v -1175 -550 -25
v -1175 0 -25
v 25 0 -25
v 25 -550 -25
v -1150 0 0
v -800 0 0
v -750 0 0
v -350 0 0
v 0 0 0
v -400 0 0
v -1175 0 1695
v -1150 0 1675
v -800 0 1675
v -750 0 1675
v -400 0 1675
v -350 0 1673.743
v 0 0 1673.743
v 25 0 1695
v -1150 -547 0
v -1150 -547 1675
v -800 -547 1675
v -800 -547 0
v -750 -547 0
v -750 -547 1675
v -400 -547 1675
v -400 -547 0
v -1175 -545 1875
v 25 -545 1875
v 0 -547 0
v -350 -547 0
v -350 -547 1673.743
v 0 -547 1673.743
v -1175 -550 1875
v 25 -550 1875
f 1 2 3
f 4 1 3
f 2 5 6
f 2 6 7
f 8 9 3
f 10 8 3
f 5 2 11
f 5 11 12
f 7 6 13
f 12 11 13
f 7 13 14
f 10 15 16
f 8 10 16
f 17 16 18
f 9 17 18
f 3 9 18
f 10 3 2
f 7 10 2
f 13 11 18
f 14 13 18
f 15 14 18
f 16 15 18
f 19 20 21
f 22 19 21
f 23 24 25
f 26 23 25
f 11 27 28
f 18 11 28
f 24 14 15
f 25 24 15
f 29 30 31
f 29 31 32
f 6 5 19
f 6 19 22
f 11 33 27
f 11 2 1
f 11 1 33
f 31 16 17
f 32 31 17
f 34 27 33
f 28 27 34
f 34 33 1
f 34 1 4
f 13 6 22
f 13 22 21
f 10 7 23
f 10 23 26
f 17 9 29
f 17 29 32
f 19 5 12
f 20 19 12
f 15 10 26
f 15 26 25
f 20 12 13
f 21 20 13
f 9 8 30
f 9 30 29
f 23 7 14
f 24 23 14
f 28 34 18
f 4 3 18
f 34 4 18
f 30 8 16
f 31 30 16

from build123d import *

# Parameters (mm, degrees)
F0_W     = 1200
F0_H     = 1900
F0_W_2   = 350
F0_H_2   = 1675
F0_H_3   = 1673.7432479858
F1_DEPTH = 550
F2_SIZE2 = 545
F2_SIZE  = 180
F3_START = 547
F3_DEPTH = 3


with BuildPart() as f1:
    # F0 (on Front) → F1 (new body)
    with BuildSketch(Plane.XZ):
        with Locations((-575, 925)):
            Rectangle(F0_W, F0_H)
        with Locations((-975, 837.5)):
            Rectangle(F0_W_2, F0_H_2, mode=Mode.SUBTRACT)
        with Locations((-575, 837.5)):
            Rectangle(F0_W_2, F0_H_2, mode=Mode.SUBTRACT)
        with Locations((-175, 836.8716239929)):
            Rectangle(F0_W_2, F0_H_3, mode=Mode.SUBTRACT)
    extrude(amount=F1_DEPTH)

    # F2
    f2_edges = [f1.edges().sort_by_distance(p)[0] for p in [
        (-575, 0, 1875),
    ]]
    f2_side = f1.faces().sort_by_distance((-575, 0, 1852.527795))[0]
    chamfer(f2_edges, length=F2_SIZE, length2=F2_SIZE2, reference=f2_side)

    # F0 (on Front) → F3 (join)
    with BuildSketch(Plane.XZ.offset(F3_START)):
        with Locations((-575, 925)):
            Rectangle(F0_W, F0_H)
        with Locations((-975, 837.5)):
            Rectangle(F0_W_2, F0_H_2, mode=Mode.SUBTRACT)
        with Locations((-575, 837.5)):
            Rectangle(F0_W_2, F0_H_2, mode=Mode.SUBTRACT)
        with Locations((-175, 836.8716239929)):
            Rectangle(F0_W_2, F0_H_3, mode=Mode.SUBTRACT)
        with Locations((-975, 837.5)):
            Rectangle(F0_W_2, F0_H_2)
        with Locations((-575, 837.5)):
            Rectangle(F0_W_2, F0_H_2)
        with Locations((-175, 836.8716239929)):
            Rectangle(F0_W_2, F0_H_3)
    extrude(amount=F3_DEPTH)


solid = f1.part
